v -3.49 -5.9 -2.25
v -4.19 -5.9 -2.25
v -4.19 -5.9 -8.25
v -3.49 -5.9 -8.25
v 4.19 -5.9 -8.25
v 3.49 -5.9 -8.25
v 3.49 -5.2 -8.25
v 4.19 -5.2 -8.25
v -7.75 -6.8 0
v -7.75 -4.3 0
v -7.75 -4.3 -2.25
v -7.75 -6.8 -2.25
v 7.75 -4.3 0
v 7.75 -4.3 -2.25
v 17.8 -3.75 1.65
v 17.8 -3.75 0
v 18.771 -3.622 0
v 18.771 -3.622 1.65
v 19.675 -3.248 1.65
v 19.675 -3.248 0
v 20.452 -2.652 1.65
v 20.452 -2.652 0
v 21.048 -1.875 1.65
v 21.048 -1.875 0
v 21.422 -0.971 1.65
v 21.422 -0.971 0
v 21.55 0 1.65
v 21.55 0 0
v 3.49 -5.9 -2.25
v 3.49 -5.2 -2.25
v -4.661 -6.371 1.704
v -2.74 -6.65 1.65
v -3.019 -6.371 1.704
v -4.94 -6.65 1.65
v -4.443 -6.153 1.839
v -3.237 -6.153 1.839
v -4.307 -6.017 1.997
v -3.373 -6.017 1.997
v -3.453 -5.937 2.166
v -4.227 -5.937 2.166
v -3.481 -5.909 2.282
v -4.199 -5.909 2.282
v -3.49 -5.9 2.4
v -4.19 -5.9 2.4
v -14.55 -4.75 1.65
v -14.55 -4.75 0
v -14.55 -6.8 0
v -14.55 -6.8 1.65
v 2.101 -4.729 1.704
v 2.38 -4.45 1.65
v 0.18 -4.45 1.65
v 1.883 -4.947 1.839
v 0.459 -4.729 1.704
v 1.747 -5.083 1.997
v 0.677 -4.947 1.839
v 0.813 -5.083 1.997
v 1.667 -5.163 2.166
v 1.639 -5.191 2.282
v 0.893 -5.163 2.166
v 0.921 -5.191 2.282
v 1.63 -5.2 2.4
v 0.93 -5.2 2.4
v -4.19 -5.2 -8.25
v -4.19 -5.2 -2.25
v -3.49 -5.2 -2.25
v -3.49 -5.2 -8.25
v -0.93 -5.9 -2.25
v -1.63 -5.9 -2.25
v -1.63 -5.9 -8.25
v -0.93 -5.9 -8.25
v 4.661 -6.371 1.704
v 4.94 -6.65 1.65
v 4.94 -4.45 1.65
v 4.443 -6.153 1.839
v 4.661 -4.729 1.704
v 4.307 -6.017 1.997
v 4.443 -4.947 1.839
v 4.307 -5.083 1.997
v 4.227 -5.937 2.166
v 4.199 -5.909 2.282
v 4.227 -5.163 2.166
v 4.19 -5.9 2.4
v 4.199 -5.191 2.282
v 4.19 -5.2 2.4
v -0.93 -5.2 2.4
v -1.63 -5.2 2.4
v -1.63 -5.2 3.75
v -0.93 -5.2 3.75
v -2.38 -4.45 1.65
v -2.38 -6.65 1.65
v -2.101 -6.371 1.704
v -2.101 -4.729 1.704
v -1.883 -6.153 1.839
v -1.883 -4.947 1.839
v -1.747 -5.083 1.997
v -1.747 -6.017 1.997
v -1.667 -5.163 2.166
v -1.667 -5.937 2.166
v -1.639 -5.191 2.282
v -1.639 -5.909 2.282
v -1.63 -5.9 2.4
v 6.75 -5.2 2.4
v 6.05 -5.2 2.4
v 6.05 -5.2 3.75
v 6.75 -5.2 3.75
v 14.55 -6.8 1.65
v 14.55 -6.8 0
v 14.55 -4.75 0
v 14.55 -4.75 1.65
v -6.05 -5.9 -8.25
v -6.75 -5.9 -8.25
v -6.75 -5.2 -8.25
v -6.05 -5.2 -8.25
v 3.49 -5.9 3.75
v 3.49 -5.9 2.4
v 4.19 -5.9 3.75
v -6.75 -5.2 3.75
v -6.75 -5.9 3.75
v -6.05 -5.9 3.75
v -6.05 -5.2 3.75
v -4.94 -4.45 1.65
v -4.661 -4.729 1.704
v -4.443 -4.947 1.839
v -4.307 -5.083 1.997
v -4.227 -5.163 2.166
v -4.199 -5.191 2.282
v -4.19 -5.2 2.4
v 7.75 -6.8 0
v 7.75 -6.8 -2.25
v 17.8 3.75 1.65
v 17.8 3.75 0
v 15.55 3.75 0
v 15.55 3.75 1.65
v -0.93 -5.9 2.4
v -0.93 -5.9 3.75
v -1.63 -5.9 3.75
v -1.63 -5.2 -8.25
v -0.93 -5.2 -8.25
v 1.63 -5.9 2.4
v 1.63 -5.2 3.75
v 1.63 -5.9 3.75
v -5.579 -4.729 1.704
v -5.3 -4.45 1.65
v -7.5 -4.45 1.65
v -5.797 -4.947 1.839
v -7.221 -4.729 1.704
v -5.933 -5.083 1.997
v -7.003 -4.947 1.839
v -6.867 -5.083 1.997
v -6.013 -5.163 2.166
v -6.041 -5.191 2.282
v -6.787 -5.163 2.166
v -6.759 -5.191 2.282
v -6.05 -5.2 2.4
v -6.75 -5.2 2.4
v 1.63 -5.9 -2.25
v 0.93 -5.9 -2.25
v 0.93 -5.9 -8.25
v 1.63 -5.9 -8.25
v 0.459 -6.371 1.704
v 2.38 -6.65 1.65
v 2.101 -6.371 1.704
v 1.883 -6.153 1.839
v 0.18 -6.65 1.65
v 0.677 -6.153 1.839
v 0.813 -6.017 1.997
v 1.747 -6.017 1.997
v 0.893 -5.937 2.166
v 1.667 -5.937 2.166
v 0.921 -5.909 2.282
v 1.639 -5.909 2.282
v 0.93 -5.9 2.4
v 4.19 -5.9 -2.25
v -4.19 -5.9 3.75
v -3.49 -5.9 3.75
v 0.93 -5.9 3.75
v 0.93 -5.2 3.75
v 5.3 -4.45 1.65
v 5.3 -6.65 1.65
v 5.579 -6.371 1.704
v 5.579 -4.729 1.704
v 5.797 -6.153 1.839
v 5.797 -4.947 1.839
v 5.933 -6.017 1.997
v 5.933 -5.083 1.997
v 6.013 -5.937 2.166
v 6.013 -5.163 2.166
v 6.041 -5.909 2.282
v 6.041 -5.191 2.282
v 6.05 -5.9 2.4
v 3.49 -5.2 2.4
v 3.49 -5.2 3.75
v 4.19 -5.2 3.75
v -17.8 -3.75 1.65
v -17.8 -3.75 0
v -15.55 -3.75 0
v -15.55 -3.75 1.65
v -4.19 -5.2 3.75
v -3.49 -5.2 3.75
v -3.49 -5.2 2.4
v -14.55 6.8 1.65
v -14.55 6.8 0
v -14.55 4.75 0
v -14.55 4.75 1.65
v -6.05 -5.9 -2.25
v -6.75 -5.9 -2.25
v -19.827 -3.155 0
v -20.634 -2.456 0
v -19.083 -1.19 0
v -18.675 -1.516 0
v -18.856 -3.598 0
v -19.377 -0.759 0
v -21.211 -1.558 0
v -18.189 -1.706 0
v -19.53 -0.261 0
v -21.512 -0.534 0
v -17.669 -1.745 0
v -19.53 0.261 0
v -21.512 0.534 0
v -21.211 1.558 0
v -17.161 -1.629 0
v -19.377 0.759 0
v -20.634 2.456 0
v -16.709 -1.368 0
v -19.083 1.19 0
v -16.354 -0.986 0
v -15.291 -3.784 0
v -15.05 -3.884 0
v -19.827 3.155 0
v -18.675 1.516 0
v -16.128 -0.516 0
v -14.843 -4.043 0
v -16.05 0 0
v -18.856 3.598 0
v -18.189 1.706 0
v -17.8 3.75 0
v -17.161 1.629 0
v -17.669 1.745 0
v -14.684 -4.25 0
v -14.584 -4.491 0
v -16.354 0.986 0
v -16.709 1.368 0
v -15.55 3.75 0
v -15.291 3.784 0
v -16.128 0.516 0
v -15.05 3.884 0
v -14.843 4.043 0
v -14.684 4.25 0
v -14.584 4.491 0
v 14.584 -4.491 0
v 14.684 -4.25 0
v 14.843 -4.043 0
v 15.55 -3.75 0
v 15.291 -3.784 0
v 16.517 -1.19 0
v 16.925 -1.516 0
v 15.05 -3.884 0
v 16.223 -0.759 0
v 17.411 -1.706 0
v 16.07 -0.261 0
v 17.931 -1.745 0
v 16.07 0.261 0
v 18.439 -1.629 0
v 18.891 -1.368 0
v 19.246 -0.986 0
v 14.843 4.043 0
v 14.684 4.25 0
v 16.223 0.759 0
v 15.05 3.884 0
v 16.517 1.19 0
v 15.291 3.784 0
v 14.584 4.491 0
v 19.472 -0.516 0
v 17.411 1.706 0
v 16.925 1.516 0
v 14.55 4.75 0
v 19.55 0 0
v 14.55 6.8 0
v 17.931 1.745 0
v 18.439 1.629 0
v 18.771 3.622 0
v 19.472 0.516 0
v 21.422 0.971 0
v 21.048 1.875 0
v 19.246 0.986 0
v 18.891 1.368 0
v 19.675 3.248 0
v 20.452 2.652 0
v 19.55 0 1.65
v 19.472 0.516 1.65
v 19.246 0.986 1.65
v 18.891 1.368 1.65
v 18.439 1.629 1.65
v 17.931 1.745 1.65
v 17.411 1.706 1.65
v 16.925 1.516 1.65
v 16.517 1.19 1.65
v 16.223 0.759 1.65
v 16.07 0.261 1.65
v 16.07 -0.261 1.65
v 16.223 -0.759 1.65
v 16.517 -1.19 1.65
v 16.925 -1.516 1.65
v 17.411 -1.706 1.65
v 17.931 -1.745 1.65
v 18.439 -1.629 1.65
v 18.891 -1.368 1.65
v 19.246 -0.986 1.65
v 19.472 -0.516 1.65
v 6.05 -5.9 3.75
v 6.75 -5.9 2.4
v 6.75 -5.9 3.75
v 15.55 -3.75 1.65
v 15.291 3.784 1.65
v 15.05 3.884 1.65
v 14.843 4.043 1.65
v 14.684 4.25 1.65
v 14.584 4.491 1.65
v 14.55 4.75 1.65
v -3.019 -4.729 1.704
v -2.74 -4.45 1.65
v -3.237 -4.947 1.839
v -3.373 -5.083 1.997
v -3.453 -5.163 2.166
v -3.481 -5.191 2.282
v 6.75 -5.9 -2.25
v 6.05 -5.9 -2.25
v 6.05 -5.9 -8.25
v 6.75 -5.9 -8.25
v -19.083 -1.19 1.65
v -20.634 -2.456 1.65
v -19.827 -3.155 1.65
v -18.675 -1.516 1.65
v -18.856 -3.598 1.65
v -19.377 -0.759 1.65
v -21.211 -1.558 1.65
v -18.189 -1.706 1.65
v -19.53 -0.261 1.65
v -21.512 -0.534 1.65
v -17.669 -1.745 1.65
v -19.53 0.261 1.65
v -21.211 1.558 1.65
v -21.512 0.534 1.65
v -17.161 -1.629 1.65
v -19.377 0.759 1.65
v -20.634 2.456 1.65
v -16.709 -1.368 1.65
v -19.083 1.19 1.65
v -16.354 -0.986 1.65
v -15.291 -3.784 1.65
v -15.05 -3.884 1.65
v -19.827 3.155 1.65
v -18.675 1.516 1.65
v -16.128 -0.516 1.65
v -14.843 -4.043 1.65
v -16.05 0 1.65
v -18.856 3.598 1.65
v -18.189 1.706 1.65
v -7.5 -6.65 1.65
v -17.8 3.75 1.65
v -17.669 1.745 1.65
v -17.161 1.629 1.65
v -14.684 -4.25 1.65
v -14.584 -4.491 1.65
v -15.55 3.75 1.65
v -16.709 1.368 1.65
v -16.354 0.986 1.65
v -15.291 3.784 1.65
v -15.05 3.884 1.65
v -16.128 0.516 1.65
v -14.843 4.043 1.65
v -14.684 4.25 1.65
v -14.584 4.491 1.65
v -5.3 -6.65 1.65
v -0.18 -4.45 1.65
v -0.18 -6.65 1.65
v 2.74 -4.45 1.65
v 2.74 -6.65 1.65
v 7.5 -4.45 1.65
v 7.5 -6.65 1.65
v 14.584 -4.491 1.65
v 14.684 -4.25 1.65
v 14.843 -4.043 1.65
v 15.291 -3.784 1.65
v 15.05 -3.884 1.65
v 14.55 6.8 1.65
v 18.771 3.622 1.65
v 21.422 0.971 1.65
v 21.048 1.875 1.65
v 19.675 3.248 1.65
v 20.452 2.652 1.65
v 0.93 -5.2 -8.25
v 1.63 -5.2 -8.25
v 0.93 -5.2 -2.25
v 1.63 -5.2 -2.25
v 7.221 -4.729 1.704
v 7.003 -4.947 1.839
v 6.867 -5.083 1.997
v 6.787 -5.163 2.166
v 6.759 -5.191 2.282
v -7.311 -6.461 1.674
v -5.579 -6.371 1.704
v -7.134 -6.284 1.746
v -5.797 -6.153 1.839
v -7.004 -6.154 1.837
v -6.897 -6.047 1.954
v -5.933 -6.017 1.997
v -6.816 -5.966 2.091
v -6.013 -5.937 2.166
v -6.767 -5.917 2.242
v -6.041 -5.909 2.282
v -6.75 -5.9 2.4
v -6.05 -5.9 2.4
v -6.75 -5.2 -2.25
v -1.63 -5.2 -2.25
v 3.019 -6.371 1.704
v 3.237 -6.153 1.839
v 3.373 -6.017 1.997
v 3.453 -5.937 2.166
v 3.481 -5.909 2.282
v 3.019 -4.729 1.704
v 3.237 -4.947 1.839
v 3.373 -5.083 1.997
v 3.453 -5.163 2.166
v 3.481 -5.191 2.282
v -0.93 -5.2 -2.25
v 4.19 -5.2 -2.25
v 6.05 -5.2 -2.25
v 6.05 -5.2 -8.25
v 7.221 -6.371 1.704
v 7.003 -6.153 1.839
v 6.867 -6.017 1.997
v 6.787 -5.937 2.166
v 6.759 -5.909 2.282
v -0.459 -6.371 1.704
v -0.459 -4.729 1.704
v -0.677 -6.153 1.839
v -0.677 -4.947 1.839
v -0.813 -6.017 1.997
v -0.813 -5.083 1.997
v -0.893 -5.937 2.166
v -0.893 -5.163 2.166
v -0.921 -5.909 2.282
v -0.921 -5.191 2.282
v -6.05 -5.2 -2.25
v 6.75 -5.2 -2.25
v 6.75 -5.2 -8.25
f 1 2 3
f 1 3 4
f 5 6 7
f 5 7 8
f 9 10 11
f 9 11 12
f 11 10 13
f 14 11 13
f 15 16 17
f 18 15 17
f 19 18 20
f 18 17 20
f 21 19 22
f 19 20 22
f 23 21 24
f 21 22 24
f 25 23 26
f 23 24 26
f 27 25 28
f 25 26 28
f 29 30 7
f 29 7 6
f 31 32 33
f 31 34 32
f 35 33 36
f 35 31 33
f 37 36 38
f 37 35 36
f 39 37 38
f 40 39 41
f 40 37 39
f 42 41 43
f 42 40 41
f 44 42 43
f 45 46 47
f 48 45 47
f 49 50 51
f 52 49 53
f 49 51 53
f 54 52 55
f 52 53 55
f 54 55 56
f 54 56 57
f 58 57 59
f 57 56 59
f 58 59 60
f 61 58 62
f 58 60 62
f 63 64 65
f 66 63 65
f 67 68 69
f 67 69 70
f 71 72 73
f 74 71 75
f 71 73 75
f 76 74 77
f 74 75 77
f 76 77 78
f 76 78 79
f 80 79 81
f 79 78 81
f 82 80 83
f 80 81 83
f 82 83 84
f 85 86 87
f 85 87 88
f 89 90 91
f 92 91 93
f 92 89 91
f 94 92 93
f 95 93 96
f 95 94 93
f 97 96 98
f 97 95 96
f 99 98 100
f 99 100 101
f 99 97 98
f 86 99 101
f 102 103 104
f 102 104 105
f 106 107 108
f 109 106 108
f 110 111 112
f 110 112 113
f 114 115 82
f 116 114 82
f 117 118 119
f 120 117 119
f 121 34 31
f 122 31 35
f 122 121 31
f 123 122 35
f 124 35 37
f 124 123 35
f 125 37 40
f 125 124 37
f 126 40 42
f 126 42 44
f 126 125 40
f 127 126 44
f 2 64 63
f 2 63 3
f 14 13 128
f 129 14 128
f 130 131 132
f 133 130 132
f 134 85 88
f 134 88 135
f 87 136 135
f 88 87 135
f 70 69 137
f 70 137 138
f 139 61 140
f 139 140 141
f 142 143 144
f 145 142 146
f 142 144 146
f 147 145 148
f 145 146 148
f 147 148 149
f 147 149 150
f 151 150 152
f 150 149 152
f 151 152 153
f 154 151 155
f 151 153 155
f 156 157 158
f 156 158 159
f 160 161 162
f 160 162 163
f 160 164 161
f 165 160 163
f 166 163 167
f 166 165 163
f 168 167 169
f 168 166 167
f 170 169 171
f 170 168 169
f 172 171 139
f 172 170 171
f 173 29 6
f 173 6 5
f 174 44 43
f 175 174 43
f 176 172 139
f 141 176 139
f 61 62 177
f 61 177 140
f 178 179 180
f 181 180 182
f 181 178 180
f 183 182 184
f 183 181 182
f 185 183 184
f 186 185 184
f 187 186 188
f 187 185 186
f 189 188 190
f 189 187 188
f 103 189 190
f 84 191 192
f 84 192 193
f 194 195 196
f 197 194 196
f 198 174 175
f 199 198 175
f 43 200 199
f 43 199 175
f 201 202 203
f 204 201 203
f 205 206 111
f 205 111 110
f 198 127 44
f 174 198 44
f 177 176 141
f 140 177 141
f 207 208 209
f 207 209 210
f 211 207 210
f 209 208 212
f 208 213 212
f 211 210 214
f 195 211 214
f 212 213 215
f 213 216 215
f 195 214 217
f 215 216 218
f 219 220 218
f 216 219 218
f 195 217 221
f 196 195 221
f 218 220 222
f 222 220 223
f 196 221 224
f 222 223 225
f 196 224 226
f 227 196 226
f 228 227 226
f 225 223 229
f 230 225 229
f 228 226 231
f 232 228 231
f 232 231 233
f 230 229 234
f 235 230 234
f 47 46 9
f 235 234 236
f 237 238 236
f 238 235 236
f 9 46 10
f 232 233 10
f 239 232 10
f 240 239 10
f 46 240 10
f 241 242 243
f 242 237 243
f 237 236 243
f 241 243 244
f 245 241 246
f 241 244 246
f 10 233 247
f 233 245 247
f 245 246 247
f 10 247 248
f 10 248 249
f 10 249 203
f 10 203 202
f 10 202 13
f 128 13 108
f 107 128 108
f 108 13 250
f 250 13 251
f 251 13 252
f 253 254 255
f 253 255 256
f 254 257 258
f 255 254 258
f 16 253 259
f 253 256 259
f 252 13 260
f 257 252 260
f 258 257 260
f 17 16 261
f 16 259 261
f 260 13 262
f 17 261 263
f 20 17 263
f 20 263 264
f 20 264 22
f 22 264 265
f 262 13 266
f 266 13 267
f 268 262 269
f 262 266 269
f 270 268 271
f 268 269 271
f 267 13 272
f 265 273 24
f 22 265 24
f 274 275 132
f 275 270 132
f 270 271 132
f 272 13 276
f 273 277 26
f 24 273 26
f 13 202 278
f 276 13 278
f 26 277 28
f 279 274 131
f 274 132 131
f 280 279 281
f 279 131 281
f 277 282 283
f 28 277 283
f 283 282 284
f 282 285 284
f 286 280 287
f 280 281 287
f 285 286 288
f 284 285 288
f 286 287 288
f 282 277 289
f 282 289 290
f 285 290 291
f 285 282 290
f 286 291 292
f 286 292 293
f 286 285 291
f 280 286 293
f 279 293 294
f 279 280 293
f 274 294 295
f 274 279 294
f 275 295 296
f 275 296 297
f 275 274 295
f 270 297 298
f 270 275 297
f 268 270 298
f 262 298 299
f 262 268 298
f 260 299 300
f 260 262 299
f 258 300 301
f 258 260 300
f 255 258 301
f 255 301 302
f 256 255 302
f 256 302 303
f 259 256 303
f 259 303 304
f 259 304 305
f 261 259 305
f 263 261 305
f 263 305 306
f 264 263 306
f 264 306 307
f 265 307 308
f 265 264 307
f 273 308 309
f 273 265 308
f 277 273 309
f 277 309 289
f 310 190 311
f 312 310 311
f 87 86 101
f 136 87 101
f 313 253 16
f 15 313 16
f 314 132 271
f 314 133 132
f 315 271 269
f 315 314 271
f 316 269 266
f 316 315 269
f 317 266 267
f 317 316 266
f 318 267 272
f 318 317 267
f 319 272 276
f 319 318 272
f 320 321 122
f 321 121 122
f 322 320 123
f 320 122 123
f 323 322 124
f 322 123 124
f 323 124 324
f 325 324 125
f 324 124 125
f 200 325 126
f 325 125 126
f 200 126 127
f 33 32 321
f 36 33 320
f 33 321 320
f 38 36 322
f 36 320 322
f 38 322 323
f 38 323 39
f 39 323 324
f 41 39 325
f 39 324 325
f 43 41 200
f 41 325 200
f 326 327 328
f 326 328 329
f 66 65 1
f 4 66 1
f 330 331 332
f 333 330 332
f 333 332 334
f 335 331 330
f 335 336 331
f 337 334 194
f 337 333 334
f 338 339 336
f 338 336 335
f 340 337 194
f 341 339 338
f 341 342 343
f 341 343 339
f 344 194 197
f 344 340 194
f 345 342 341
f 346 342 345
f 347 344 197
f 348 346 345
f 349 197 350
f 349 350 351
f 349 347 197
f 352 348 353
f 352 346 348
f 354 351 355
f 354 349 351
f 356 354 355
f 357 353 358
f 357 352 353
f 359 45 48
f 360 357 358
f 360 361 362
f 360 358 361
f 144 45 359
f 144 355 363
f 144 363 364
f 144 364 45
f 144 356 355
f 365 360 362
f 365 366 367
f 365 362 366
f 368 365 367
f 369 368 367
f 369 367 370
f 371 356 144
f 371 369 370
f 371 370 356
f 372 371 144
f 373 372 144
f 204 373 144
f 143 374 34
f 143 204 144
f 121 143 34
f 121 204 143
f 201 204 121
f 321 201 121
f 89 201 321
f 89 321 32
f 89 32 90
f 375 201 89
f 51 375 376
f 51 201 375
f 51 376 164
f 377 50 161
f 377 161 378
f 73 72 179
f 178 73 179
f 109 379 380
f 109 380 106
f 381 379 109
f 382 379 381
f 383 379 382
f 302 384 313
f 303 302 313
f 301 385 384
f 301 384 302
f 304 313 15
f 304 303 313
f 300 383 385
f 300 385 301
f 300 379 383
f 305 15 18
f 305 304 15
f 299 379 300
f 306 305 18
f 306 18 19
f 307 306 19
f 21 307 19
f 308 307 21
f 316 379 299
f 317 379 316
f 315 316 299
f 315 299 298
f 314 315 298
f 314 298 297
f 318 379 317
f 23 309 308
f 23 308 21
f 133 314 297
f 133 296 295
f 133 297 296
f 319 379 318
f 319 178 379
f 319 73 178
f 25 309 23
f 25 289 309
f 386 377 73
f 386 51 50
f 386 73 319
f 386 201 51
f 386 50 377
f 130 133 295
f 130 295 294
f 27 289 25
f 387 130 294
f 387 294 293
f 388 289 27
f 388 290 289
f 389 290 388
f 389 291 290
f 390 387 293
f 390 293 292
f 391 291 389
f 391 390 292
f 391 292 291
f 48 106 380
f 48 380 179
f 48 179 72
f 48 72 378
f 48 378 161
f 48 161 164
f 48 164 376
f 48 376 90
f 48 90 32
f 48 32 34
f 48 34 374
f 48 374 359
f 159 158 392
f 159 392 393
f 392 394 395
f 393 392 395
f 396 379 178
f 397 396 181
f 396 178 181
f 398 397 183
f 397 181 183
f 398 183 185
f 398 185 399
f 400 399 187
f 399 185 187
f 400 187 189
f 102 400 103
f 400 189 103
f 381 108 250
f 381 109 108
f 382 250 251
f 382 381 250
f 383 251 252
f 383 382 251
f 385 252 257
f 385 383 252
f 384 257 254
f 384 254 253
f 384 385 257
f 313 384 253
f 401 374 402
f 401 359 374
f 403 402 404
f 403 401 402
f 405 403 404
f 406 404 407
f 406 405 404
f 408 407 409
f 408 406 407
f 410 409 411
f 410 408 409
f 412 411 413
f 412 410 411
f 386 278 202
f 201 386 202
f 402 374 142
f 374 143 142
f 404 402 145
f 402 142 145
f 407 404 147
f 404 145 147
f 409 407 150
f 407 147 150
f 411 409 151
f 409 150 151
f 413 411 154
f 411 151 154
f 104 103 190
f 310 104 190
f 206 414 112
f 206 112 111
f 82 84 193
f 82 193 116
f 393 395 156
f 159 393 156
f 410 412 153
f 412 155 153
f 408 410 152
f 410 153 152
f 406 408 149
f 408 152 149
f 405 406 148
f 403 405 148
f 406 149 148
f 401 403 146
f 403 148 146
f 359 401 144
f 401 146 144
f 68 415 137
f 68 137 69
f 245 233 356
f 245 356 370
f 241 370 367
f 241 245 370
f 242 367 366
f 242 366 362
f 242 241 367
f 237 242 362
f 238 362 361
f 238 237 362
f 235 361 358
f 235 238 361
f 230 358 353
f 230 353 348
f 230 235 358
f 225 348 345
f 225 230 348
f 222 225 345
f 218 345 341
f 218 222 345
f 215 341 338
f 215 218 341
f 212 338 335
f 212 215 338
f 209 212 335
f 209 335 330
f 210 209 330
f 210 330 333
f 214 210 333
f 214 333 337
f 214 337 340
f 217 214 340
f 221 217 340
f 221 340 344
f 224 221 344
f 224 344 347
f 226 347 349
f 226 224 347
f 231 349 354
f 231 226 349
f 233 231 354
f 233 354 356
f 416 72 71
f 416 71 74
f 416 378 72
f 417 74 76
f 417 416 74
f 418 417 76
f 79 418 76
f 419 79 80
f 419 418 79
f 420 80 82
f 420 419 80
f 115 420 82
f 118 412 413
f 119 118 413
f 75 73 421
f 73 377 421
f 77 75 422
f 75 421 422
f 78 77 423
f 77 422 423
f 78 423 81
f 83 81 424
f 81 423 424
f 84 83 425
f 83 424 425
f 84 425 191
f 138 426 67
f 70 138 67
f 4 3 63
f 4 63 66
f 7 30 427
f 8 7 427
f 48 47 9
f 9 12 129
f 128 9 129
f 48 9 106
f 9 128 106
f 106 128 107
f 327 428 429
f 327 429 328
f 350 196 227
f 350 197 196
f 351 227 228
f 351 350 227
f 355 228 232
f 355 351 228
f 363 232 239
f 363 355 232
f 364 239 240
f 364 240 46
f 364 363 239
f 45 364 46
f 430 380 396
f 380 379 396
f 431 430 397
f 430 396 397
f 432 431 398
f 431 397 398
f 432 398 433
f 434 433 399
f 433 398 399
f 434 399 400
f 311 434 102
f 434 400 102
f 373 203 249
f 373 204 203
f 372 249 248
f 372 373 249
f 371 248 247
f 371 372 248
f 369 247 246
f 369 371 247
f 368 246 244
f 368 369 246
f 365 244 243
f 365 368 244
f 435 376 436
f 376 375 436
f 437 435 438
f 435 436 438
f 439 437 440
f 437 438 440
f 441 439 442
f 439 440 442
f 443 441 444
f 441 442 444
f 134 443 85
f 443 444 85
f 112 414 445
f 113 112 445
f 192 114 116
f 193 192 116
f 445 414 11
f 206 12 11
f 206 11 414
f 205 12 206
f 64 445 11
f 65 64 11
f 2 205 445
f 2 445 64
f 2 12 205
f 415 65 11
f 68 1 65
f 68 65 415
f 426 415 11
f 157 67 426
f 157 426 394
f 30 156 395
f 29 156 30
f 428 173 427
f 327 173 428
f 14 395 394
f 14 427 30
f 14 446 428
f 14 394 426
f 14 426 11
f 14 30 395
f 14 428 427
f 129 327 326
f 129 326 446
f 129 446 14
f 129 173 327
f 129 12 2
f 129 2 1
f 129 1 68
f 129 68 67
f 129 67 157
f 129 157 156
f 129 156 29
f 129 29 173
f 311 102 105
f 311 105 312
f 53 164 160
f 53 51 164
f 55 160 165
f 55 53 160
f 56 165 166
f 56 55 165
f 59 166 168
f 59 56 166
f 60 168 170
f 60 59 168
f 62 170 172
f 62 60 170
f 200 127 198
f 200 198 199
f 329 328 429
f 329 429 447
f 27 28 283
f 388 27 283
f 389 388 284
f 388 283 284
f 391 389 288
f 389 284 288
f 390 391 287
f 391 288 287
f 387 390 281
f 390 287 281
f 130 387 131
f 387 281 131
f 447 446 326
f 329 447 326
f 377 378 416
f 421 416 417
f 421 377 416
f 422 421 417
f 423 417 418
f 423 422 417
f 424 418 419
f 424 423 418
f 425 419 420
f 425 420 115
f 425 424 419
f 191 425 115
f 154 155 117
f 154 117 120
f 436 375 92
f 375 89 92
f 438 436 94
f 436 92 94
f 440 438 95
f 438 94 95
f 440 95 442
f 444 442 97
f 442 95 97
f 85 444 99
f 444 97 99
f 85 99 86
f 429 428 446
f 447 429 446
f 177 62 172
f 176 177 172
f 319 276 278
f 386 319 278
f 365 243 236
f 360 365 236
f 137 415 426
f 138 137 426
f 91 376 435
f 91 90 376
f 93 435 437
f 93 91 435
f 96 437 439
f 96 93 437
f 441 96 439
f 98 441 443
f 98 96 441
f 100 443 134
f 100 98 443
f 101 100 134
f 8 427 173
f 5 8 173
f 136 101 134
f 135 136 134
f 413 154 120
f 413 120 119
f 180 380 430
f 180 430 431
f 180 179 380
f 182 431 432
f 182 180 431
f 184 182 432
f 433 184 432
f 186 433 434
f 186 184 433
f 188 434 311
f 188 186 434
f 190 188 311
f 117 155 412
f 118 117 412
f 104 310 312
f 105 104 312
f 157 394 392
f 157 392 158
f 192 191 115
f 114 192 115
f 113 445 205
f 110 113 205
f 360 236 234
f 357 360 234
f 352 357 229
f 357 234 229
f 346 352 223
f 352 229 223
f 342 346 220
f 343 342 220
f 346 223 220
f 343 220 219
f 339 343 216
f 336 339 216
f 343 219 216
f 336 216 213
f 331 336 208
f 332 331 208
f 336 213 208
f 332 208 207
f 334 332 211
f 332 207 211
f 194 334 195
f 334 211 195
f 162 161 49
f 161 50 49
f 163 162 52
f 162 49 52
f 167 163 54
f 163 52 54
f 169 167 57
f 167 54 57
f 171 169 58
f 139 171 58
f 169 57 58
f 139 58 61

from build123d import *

# Parameters (mm, degrees)
F0_R          = 1.75
F1_DEPTH      = 1.65
F2_R          = 1
F3_W          = 15.5
F3_H          = 2.5
F4_DEPTH      = 2.25
F5_W          = 0.7
F5_H          = 0.7
F6_DEPTH      = 6
F6_DEPTH_BACK = 6
F7_R          = 0.75


with BuildPart() as f1:
    # F0 (on Top) → F1 (new body)
    with BuildSketch(Plane.XY):
        with BuildLine():
            Line((14.55, 6.8), (-14.55, 6.8))
            Line((-14.55, 6.8), (-14.55, 3.75))
            Line((-14.55, 3.75), (-14.55, 1.8708286934))
            ThreePointArc((-14.55, 1.8708286934), (-14.1771558135, 0.9682458366), (-14.05, 0))
            ThreePointArc((-14.05, 0), (-14.1771558135, -0.9682458366), (-14.55, -1.8708286934))
            Line((-14.55, -1.8708286934), (-14.55, -3.75))
            Line((-14.55, -3.75), (-14.55, -6.8))
            Line((-14.55, -6.8), (14.55, -6.8))
            Line((14.55, -6.8), (14.55, -3.75))
            Line((14.55, -3.75), (14.55, -1.8708286934))
            ThreePointArc((14.55, -1.8708286934), (14.05, 0), (14.55, 1.8708286934))
            Line((14.55, 1.8708286934), (14.55, 3.75))
            Line((14.55, 3.75), (14.55, 6.8))
        make_face()
        with BuildLine():
            Line((-14.55, 1.8708286934), (-14.55, 3.75))
            Line((-14.55, 3.75), (-17.8, 3.75))
            ThreePointArc((-17.8, 3.75), (-15.9229155054, 3.2463908884), (-14.55, 1.8708286934))
        make_face()
        with BuildLine():
            Line((17.8, 3.75), (14.55, 3.75))
            Line((14.55, 3.75), (14.55, 1.8708286934))
            ThreePointArc((14.55, 1.8708286934), (15.9229155054, 3.2463908884), (17.8, 3.75))
        make_face()
        with BuildLine():
            Line((-14.55, -1.8708286934), (-14.55, 1.8708286934))
            ThreePointArc((-14.55, 1.8708286934), (-15.9229155054, 3.2463908884), (-17.8, 3.75))
            ThreePointArc((-17.8, 3.75), (-21.55, 0), (-17.8, -3.75))
            ThreePointArc((-17.8, -3.75), (-15.9229155054, -3.2463908884), (-14.55, -1.8708286934))
        make_face()
        with Locations((-17.8, 0)):
            Circle(F0_R, mode=Mode.SUBTRACT)
        with BuildLine():
            ThreePointArc((17.8, 3.75), (15.9229155054, 3.2463908884), (14.55, 1.8708286934))
            Line((14.55, 1.8708286934), (14.55, -1.8708286934))
            ThreePointArc((14.55, -1.8708286934), (15.9229155054, -3.2463908884), (17.8, -3.75))
            ThreePointArc((17.8, -3.75), (20.4516504294, -2.6516504294), (21.55, 0))
            ThreePointArc((21.55, 0), (20.4516504294, 2.6516504294), (17.8, 3.75))
        make_face()
        with Locations((17.8, 0)):
            Circle(F0_R, mode=Mode.SUBTRACT)
        with BuildLine():
            Line((-14.55, -3.75), (-14.55, -1.8708286934))
            ThreePointArc((-14.55, -1.8708286934), (-15.9229155054, -3.2463908884), (-17.8, -3.75))
            Line((-17.8, -3.75), (-14.55, -3.75))
        make_face()
        with BuildLine():
            ThreePointArc((17.8, -3.75), (15.9229155054, -3.2463908884), (14.55, -1.8708286934))
            Line((14.55, -1.8708286934), (14.55, -3.75))
            Line((14.55, -3.75), (17.8, -3.75))
        make_face()
        with BuildLine():
            ThreePointArc((-14.05, 0), (-14.1771558135, 0.9682458366), (-14.55, 1.8708286934))
            Line((-14.55, 1.8708286934), (-14.55, -1.8708286934))
            ThreePointArc((-14.55, -1.8708286934), (-14.1771558135, -0.9682458366), (-14.05, 0))
        make_face()
        with BuildLine():
            Line((14.55, -1.8708286934), (14.55, 1.8708286934))
            ThreePointArc((14.55, 1.8708286934), (14.05, 0), (14.55, -1.8708286934))
        make_face()
    extrude(amount=F1_DEPTH)

    # F2
    f2_edges = [f1.edges().sort_by_distance(p)[0] for p in [
        (14.55, 3.75, 0.825),
        (14.55, -3.75, 0.825),
        (-14.55, -3.75, 0.825),
        (-14.55, 3.75, 0.825),
    ]]
    fillet(f2_edges, radius=F2_R)

    # F3 (on face) → F4 (join)
    with BuildSketch(Plane(origin=(0, 0, 0), x_dir=(1, 0, 0), z_dir=(0, 0, -1))):
        with Locations((0, 5.55)):
            Rectangle(F3_W, F3_H)
    extrude(amount=F4_DEPTH)

    # F5 (on face) → F6 (join, two sides)
    with BuildSketch(Plane(origin=(0, 0, -2.25), x_dir=(1, 0, 0), z_dir=(0, 0, -1))) as f6_sk:
        with Locations((-6.4, 5.55)):
            Rectangle(F5_W, F5_H)
        with Locations((6.4, 5.55)):
            Rectangle(F5_W, F5_H)
        with Locations((-3.84, 5.55)):
            Rectangle(F5_W, F5_H)
        with Locations((-1.28, 5.55)):
            Rectangle(F5_W, F5_H)
        with Locations((1.28, 5.55)):
            Rectangle(F5_W, F5_H)
        with Locations((3.84, 5.55)):
            Rectangle(F5_W, F5_H)
    extrude(amount=F6_DEPTH)
    extrude(f6_sk.sketch, amount=-F6_DEPTH_BACK)

    # F7
    f7_edges = [f1.edges().sort_by_distance(p)[0] for p in [
        (6.4, -5.2, 1.65),
        (6.75, -5.55, 1.65),
        (6.4, -5.9, 1.65),
        (6.05, -5.55, 1.65),
        (4.19, -5.55, 1.65),
        (3.84, -5.9, 1.65),
        (3.49, -5.55, 1.65),
        (3.84, -5.2, 1.65),
        (1.28, -5.2, 1.65),
        (0.93, -5.55, 1.65),
        (1.28, -5.9, 1.65),
        (1.63, -5.55, 1.65),
        (-1.28, -5.9, 1.65),
        (-1.63, -5.55, 1.65),
        (-0.93, -5.55, 1.65),
        (-1.28, -5.2, 1.65),
        (-3.84, -5.9, 1.65),
        (-4.19, -5.55, 1.65),
        (-3.49, -5.55, 1.65),
        (-3.84, -5.2, 1.65),
        (-6.4, -5.2, 1.65),
        (-6.75, -5.55, 1.65),
        (-6.4, -5.9, 1.65),
        (-6.05, -5.55, 1.65),
    ]]
    fillet(f7_edges, radius=F7_R)


solid = f1.part
